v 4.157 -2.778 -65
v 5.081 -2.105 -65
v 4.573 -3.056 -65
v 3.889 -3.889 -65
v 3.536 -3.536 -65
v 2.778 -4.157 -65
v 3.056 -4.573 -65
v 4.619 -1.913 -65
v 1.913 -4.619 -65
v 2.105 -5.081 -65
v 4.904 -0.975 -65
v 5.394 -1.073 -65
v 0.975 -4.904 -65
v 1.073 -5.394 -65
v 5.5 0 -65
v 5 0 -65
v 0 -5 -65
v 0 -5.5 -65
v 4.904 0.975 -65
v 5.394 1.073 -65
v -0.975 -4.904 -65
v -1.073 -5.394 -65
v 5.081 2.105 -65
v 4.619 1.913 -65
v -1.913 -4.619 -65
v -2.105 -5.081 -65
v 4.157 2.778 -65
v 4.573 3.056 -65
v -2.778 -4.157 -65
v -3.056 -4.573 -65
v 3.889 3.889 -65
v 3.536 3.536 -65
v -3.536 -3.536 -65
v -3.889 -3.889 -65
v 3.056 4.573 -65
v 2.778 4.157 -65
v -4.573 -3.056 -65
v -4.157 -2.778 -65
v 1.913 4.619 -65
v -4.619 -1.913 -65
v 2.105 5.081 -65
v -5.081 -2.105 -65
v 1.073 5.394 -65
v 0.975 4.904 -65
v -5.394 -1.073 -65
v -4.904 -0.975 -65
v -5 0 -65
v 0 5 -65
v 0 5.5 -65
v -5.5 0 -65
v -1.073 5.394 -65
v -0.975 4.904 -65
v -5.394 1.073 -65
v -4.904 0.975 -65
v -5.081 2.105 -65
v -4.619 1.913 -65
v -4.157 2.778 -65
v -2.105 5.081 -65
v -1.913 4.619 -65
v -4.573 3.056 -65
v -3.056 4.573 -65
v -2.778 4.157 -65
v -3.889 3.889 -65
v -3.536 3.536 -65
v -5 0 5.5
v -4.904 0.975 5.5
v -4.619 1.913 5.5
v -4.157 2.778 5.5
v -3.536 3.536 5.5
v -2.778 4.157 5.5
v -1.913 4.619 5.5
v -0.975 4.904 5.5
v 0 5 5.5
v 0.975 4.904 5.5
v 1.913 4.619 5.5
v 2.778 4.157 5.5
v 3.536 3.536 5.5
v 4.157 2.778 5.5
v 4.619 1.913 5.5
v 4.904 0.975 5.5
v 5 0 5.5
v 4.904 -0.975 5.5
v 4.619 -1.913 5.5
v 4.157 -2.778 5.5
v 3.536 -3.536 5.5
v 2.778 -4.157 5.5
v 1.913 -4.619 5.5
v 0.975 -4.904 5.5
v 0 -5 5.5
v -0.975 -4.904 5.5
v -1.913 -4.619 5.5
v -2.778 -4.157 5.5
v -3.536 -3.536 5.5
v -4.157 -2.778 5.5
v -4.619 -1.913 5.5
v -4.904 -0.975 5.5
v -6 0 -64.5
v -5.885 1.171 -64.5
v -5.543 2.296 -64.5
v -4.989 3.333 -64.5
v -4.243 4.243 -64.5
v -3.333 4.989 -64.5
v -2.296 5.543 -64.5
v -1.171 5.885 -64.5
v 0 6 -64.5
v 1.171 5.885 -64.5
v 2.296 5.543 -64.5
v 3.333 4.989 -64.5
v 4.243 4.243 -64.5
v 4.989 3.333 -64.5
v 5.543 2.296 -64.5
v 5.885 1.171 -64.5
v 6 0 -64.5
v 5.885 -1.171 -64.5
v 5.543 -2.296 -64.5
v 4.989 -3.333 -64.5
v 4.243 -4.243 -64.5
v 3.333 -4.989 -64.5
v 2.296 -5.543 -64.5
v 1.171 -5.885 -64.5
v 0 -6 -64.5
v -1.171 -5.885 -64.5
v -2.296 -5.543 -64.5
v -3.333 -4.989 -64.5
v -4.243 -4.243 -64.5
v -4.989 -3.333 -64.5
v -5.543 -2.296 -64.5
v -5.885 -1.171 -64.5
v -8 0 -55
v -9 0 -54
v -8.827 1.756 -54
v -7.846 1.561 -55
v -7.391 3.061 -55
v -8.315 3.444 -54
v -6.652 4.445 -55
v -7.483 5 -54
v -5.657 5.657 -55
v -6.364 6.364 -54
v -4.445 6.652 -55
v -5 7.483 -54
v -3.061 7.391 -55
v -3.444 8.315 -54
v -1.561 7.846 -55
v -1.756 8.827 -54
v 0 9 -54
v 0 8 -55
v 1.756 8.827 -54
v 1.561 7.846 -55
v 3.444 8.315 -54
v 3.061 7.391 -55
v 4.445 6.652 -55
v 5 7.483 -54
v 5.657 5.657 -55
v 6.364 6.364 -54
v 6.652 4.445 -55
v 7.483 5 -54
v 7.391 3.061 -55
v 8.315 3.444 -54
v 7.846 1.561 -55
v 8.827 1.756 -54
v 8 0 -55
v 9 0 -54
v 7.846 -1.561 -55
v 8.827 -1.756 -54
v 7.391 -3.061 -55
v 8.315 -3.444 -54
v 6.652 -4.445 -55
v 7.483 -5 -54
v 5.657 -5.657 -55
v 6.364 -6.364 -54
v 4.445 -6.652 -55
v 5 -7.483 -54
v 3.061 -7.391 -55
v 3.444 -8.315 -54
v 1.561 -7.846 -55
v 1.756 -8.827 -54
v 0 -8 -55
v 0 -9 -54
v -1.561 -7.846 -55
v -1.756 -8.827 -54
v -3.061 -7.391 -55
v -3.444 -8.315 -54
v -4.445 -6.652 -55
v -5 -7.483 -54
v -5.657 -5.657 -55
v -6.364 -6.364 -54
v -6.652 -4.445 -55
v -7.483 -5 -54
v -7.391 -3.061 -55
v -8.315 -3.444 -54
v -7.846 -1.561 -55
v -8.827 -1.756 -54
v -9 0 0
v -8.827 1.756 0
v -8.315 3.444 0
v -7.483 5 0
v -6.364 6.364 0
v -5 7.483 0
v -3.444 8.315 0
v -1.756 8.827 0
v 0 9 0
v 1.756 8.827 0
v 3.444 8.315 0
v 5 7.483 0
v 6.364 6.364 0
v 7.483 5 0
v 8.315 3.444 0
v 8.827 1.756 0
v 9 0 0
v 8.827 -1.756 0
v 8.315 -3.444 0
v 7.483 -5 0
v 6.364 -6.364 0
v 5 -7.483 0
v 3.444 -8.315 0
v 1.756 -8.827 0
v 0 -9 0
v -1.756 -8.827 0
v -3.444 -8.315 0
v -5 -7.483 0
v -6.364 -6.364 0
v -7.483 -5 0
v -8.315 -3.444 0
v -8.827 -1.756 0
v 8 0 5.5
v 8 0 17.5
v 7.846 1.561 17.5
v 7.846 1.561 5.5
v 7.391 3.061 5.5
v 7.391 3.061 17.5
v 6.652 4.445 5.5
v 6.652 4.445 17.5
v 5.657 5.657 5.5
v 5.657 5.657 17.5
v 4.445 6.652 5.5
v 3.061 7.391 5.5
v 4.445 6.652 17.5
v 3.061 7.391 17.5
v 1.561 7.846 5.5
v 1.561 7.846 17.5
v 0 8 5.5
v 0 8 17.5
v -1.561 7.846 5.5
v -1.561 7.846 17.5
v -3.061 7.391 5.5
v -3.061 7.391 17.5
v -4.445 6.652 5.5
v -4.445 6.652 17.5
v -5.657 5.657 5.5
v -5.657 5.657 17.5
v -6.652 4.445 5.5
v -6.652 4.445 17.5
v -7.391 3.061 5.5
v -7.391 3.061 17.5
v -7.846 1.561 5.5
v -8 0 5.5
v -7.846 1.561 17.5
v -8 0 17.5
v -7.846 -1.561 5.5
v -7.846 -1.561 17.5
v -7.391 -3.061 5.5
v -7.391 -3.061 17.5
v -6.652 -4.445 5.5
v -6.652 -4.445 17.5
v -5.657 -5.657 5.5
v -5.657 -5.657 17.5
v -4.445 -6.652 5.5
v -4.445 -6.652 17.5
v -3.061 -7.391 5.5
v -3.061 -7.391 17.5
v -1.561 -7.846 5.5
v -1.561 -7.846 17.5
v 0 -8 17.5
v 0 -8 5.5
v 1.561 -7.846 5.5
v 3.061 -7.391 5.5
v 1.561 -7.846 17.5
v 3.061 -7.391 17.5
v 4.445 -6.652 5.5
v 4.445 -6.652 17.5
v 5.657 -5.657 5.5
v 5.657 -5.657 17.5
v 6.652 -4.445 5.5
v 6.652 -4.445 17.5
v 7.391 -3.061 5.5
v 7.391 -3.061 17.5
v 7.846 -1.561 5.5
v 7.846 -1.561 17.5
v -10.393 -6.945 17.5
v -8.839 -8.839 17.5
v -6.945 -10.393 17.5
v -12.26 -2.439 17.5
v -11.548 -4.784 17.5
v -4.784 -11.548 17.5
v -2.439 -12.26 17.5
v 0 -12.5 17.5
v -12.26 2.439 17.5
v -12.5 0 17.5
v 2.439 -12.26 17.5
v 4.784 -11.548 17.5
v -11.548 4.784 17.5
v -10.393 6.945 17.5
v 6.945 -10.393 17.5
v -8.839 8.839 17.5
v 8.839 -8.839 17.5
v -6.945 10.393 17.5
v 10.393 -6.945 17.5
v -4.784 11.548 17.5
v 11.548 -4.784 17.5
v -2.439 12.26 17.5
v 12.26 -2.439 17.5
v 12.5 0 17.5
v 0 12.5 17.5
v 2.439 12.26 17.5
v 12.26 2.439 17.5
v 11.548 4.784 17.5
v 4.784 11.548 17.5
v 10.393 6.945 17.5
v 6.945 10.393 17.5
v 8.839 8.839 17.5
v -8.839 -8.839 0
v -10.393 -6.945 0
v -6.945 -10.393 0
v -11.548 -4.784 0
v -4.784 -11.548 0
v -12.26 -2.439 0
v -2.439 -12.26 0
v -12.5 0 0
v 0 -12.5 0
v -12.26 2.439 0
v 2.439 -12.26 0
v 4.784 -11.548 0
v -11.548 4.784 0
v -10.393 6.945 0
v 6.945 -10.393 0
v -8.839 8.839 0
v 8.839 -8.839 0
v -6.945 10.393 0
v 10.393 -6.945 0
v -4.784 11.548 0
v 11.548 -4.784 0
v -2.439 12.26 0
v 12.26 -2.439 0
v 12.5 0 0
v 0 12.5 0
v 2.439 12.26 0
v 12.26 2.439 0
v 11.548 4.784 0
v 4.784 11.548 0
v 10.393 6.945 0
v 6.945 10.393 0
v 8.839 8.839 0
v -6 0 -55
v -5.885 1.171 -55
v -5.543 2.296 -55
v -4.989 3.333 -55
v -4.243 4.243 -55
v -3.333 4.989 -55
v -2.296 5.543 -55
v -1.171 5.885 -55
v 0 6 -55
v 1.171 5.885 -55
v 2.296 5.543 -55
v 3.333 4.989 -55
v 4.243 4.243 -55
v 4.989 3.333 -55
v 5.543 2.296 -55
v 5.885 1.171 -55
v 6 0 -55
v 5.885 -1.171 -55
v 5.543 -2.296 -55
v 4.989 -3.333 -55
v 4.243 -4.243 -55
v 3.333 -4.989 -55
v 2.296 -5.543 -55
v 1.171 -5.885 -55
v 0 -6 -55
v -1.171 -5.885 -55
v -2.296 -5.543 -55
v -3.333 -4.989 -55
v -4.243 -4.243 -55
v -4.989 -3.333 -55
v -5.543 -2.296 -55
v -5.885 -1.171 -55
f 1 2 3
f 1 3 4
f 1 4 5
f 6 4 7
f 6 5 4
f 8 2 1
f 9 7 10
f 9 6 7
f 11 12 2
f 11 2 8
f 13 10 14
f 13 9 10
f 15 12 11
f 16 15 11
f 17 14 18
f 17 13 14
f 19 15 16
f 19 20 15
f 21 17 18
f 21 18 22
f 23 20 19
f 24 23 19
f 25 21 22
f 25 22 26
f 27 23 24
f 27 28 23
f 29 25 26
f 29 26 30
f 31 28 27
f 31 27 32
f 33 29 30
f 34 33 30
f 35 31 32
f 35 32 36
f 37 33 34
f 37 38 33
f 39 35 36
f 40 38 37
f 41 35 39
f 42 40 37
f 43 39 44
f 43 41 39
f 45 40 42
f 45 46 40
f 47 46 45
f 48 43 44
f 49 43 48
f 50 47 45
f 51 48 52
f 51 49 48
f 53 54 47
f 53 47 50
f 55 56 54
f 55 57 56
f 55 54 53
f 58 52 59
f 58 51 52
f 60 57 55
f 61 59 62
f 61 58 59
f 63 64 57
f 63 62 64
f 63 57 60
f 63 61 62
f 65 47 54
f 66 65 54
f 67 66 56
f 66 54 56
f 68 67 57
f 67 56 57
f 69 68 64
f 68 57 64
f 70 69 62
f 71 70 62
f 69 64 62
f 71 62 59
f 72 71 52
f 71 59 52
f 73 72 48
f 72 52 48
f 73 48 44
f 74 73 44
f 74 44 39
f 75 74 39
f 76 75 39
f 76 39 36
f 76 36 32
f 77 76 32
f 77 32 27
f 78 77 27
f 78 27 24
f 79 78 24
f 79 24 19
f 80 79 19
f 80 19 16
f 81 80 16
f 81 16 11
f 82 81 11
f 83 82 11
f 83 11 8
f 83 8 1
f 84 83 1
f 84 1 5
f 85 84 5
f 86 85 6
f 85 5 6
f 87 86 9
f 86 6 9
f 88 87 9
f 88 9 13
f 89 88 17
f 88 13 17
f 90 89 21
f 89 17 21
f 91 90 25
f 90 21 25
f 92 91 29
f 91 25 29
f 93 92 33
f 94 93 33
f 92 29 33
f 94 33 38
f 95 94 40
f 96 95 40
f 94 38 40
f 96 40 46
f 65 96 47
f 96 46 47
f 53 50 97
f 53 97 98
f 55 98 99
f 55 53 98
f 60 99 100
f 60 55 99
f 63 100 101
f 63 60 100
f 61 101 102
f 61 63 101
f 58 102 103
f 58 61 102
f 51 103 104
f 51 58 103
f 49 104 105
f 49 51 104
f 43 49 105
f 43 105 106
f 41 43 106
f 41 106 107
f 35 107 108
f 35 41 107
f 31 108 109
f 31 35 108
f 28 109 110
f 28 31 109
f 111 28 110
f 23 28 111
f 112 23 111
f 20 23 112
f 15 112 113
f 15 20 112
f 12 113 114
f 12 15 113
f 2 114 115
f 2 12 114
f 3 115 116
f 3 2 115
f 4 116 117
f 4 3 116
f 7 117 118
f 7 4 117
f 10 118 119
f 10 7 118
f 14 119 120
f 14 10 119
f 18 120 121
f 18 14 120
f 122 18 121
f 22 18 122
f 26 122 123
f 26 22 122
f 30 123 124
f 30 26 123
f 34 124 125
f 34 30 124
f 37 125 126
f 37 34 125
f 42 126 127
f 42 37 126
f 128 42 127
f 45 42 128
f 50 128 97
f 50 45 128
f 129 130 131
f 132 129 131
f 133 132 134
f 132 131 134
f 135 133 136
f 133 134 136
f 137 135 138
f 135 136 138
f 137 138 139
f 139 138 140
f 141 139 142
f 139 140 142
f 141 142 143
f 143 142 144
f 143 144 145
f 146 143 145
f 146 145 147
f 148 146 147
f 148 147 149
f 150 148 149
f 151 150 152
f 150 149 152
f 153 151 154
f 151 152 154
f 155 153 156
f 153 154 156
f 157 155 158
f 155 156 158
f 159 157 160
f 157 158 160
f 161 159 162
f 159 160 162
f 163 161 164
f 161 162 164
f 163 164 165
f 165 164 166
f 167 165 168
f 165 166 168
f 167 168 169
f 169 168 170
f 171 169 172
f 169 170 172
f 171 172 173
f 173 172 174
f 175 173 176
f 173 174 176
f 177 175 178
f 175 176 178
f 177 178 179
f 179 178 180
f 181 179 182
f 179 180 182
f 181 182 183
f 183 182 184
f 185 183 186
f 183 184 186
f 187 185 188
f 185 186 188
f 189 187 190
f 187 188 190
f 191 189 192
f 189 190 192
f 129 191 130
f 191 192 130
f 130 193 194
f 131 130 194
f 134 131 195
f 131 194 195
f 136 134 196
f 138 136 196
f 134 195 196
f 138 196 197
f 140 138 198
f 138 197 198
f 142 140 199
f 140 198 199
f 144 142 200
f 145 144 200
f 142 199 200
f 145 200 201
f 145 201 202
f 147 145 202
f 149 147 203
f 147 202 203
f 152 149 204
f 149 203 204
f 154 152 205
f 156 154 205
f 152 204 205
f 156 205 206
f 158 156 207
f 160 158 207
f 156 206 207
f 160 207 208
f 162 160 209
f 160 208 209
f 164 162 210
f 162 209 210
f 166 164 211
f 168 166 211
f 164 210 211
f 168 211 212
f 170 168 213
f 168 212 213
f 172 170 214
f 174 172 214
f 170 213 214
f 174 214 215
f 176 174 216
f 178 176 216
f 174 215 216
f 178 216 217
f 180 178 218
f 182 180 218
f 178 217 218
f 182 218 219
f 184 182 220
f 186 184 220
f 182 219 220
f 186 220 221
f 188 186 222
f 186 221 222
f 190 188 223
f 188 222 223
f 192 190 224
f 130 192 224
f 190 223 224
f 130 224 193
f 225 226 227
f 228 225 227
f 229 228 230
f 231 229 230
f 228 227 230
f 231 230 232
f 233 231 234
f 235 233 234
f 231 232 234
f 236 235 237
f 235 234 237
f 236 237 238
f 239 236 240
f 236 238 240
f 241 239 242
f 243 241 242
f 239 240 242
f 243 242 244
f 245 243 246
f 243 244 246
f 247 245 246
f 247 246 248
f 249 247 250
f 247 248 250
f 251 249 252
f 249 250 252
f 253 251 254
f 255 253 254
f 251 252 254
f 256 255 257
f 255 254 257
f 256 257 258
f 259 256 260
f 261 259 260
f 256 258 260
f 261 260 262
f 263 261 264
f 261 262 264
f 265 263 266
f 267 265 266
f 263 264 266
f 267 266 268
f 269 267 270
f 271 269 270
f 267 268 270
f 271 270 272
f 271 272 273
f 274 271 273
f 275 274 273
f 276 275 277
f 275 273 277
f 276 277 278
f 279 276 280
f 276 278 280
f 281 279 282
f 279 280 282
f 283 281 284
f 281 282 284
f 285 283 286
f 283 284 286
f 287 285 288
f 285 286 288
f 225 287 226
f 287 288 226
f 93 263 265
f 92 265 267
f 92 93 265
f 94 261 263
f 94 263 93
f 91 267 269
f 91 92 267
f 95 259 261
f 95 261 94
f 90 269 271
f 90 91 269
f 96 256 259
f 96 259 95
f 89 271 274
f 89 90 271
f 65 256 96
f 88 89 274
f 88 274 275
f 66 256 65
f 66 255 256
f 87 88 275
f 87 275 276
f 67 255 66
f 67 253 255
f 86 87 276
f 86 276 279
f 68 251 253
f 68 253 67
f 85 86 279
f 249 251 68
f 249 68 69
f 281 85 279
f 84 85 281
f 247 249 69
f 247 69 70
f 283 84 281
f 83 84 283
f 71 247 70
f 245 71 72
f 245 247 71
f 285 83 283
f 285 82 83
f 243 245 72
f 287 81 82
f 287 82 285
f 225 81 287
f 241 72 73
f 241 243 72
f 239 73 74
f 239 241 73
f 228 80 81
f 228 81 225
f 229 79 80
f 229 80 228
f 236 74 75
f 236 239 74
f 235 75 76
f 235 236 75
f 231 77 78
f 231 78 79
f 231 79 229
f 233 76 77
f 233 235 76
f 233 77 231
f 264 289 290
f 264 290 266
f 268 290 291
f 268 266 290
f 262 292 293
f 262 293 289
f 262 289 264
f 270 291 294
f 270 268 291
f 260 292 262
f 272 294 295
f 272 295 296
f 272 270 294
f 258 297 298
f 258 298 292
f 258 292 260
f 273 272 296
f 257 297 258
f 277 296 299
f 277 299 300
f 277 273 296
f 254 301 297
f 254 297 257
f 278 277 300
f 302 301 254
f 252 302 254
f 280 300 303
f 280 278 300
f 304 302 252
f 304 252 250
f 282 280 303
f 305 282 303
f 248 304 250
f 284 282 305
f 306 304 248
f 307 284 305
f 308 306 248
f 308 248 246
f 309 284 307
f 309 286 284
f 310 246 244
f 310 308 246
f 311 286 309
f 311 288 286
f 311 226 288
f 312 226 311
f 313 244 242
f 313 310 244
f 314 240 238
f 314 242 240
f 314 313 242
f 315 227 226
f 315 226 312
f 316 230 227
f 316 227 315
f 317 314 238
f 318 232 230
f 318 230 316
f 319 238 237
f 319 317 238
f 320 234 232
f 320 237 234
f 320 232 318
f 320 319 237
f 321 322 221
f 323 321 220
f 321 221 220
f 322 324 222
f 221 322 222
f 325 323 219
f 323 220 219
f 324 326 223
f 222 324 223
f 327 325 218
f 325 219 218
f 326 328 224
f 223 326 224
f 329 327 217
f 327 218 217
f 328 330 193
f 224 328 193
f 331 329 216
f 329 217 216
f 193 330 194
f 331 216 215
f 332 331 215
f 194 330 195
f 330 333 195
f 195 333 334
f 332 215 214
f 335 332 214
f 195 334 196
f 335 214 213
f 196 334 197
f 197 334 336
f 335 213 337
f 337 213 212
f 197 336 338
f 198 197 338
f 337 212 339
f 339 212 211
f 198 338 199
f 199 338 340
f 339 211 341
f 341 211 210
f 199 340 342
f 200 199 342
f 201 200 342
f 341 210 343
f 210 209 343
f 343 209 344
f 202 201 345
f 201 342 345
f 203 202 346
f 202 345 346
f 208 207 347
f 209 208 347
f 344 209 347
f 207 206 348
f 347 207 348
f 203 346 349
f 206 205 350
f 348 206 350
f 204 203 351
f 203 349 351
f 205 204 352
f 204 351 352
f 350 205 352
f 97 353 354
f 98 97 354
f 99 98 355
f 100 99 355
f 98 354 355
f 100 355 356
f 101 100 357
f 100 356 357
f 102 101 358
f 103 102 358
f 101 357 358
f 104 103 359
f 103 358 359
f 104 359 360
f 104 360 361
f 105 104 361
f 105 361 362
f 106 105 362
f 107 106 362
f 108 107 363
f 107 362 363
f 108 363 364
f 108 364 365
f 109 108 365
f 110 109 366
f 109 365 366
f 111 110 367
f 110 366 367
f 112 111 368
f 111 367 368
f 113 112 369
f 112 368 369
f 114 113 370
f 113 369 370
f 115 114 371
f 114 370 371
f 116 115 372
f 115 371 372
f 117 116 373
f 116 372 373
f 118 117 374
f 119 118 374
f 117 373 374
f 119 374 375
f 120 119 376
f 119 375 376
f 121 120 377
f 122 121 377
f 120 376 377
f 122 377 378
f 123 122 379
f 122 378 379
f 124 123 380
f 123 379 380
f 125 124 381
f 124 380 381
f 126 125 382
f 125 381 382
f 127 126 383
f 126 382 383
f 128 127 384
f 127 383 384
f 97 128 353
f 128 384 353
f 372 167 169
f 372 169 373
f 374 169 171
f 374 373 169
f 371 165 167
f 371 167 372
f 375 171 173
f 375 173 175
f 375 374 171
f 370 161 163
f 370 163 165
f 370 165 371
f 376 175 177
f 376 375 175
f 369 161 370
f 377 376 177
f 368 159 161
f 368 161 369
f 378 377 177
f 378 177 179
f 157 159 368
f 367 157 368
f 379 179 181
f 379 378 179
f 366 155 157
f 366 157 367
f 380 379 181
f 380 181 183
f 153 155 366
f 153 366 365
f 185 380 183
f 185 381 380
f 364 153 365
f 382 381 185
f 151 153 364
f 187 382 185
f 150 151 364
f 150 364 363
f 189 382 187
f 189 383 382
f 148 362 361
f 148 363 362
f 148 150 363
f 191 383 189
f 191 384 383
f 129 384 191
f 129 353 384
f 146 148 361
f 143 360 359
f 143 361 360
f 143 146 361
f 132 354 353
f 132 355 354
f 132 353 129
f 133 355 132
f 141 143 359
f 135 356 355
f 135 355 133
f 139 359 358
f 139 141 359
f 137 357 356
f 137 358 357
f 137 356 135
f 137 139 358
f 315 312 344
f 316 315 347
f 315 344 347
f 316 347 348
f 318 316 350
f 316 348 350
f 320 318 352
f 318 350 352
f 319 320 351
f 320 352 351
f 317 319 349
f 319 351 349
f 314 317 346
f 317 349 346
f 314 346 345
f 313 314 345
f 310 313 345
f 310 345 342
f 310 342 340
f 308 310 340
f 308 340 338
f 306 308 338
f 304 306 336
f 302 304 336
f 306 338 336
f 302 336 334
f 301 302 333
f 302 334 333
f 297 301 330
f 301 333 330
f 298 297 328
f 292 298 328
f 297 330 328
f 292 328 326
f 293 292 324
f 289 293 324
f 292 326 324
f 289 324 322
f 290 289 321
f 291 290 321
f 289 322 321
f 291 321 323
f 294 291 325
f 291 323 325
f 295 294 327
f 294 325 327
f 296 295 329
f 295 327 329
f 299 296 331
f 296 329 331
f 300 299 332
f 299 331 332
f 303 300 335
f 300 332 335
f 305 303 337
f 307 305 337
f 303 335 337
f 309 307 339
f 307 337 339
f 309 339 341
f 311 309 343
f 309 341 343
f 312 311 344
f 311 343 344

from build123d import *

# Parameters (mm, degrees)
SKETCH_1_R          = 12.5
EXTRUDE_1_DEPTH     = 17.5
SKETCH_2_R          = 9
EXTRUDE_2_DEPTH     = 55
SKETCH_3_R          = 6
EXTRUDE_3_DEPTH     = 10
CHAMFER_1_SIZE      = 0.5
SKETCH_4_R          = 5
CUT_EXTRUDE_1_DEPTH = 139
CHAMFER_2_SIZE      = 1
SKETCH_5_R          = 8
CUT_EXTRUDE_2_DEPTH = 12


with BuildPart() as part:
    # 草图1 → 凸台-拉伸1 (new body)
    with BuildSketch(Plane.XY):
        Circle(SKETCH_1_R)
    extrude(amount=EXTRUDE_1_DEPTH)

    # 草图2 → 凸台-拉伸2 (add)
    with BuildSketch(Plane(origin=(0, 0, 0), x_dir=(-1, 0, 0), z_dir=(0, 0, -1))):
        Circle(SKETCH_2_R)
    extrude(amount=EXTRUDE_2_DEPTH)

    # 草图3 → 凸台-拉伸3 (add)
    with BuildSketch(Plane(origin=(0, 0, -55), x_dir=(-1, 0, 0), z_dir=(0, 0, -1))):
        Circle(SKETCH_3_R)
    extrude(amount=EXTRUDE_3_DEPTH)

    # 倒角1
    chamfer_1_edges = [part.edges().sort_by_distance(p)[0] for p in [
        (6, 0, -65),
    ]]
    chamfer(chamfer_1_edges, length=CHAMFER_1_SIZE)

    # 草图4 → 切除-拉伸1 (cut)
    with BuildSketch(Plane(origin=(0, 0, -65), x_dir=(-1, 0, 0), z_dir=(0, 0, -1))):
        Circle(SKETCH_4_R)
    extrude(amount=-CUT_EXTRUDE_1_DEPTH, mode=Mode.SUBTRACT)

    # 倒角2
    chamfer_2_edges = [part.edges().sort_by_distance(p)[0] for p in [
        (9, 0, -55),
    ]]
    chamfer(chamfer_2_edges, length=CHAMFER_2_SIZE)

    # 草图5 → 切除-拉伸2 (cut)
    with BuildSketch(Plane.XY.offset(17.5)):
        Circle(SKETCH_5_R)
    extrude(amount=-CUT_EXTRUDE_2_DEPTH, mode=Mode.SUBTRACT)


solid = part.part
